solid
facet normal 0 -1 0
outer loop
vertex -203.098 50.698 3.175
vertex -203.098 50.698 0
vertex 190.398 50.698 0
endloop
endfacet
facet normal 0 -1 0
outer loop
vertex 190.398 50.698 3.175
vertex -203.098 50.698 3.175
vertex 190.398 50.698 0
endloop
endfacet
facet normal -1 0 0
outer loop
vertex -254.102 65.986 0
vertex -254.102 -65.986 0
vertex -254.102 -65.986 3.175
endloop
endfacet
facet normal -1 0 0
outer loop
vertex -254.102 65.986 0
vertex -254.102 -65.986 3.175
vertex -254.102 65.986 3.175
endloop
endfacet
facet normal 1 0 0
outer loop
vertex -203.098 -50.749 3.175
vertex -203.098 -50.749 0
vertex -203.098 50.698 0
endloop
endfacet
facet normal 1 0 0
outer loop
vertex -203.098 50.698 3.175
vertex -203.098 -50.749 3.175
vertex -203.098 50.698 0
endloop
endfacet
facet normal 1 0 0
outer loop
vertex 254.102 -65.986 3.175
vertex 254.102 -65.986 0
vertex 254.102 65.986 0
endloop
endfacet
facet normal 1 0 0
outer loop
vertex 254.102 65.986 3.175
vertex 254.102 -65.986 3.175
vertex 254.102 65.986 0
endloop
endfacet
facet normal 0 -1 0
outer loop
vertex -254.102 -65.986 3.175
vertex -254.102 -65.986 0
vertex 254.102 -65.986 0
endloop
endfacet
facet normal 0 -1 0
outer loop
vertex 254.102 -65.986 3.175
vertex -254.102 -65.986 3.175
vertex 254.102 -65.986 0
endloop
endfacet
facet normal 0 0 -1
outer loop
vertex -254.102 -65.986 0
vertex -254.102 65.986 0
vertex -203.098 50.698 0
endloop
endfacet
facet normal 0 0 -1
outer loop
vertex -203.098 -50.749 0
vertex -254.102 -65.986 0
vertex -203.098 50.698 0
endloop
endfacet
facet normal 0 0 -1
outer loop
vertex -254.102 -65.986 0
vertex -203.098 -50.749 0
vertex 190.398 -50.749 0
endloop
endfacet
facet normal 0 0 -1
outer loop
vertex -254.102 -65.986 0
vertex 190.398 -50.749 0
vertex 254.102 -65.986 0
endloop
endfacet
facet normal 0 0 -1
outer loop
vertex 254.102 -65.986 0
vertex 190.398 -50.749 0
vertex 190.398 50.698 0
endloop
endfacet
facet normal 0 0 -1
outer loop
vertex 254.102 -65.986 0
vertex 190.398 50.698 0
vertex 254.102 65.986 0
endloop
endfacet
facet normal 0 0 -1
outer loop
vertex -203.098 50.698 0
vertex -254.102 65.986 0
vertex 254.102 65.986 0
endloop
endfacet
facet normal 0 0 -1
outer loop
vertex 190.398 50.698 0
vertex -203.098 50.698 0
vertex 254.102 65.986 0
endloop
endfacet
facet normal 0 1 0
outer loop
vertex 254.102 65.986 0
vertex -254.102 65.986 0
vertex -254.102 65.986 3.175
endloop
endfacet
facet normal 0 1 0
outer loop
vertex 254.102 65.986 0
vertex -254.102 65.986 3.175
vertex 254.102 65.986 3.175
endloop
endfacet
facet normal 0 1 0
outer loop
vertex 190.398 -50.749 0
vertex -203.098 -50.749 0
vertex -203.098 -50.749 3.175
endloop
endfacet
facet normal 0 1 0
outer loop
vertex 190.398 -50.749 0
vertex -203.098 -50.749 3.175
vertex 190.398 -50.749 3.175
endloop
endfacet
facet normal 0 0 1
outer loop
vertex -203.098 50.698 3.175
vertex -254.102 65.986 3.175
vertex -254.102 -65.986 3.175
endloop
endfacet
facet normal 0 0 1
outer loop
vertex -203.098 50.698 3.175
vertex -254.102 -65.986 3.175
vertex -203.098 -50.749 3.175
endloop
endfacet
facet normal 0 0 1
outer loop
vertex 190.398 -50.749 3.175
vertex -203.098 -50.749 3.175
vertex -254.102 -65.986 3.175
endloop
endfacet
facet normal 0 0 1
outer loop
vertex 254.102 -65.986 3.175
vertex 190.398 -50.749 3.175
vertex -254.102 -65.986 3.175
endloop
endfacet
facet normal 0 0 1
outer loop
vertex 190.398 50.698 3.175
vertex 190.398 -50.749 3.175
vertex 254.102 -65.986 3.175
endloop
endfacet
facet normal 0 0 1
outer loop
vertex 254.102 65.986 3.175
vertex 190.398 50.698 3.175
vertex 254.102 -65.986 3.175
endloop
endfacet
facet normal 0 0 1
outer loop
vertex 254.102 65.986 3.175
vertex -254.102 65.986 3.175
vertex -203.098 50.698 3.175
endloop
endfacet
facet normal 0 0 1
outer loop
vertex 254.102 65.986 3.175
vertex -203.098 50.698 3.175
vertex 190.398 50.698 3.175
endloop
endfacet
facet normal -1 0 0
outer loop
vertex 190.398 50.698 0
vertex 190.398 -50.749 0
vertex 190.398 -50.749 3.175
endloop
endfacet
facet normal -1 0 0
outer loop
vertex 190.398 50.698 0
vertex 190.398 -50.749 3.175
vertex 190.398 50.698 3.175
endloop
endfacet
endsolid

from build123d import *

# Parameters (mm, degrees)
SKETCH1_W           = 508.2032
SKETCH1_H           = 131.97205
SKETCH1_W_2         = 393.4968
SKETCH1_H_2         = 101.4476
BOSS_EXTRUDE1_DEPTH = 3.175


with BuildPart() as part:
    # Sketch1 → Boss-Extrude1 (new body)
    with BuildSketch(Plane.XY):
        Rectangle(SKETCH1_W, SKETCH1_H)
        with Locations((-6.35, -0.0254)):
            Rectangle(SKETCH1_W_2, SKETCH1_H_2, mode=Mode.SUBTRACT)
    extrude(amount=BOSS_EXTRUDE1_DEPTH)


solid = part.part
